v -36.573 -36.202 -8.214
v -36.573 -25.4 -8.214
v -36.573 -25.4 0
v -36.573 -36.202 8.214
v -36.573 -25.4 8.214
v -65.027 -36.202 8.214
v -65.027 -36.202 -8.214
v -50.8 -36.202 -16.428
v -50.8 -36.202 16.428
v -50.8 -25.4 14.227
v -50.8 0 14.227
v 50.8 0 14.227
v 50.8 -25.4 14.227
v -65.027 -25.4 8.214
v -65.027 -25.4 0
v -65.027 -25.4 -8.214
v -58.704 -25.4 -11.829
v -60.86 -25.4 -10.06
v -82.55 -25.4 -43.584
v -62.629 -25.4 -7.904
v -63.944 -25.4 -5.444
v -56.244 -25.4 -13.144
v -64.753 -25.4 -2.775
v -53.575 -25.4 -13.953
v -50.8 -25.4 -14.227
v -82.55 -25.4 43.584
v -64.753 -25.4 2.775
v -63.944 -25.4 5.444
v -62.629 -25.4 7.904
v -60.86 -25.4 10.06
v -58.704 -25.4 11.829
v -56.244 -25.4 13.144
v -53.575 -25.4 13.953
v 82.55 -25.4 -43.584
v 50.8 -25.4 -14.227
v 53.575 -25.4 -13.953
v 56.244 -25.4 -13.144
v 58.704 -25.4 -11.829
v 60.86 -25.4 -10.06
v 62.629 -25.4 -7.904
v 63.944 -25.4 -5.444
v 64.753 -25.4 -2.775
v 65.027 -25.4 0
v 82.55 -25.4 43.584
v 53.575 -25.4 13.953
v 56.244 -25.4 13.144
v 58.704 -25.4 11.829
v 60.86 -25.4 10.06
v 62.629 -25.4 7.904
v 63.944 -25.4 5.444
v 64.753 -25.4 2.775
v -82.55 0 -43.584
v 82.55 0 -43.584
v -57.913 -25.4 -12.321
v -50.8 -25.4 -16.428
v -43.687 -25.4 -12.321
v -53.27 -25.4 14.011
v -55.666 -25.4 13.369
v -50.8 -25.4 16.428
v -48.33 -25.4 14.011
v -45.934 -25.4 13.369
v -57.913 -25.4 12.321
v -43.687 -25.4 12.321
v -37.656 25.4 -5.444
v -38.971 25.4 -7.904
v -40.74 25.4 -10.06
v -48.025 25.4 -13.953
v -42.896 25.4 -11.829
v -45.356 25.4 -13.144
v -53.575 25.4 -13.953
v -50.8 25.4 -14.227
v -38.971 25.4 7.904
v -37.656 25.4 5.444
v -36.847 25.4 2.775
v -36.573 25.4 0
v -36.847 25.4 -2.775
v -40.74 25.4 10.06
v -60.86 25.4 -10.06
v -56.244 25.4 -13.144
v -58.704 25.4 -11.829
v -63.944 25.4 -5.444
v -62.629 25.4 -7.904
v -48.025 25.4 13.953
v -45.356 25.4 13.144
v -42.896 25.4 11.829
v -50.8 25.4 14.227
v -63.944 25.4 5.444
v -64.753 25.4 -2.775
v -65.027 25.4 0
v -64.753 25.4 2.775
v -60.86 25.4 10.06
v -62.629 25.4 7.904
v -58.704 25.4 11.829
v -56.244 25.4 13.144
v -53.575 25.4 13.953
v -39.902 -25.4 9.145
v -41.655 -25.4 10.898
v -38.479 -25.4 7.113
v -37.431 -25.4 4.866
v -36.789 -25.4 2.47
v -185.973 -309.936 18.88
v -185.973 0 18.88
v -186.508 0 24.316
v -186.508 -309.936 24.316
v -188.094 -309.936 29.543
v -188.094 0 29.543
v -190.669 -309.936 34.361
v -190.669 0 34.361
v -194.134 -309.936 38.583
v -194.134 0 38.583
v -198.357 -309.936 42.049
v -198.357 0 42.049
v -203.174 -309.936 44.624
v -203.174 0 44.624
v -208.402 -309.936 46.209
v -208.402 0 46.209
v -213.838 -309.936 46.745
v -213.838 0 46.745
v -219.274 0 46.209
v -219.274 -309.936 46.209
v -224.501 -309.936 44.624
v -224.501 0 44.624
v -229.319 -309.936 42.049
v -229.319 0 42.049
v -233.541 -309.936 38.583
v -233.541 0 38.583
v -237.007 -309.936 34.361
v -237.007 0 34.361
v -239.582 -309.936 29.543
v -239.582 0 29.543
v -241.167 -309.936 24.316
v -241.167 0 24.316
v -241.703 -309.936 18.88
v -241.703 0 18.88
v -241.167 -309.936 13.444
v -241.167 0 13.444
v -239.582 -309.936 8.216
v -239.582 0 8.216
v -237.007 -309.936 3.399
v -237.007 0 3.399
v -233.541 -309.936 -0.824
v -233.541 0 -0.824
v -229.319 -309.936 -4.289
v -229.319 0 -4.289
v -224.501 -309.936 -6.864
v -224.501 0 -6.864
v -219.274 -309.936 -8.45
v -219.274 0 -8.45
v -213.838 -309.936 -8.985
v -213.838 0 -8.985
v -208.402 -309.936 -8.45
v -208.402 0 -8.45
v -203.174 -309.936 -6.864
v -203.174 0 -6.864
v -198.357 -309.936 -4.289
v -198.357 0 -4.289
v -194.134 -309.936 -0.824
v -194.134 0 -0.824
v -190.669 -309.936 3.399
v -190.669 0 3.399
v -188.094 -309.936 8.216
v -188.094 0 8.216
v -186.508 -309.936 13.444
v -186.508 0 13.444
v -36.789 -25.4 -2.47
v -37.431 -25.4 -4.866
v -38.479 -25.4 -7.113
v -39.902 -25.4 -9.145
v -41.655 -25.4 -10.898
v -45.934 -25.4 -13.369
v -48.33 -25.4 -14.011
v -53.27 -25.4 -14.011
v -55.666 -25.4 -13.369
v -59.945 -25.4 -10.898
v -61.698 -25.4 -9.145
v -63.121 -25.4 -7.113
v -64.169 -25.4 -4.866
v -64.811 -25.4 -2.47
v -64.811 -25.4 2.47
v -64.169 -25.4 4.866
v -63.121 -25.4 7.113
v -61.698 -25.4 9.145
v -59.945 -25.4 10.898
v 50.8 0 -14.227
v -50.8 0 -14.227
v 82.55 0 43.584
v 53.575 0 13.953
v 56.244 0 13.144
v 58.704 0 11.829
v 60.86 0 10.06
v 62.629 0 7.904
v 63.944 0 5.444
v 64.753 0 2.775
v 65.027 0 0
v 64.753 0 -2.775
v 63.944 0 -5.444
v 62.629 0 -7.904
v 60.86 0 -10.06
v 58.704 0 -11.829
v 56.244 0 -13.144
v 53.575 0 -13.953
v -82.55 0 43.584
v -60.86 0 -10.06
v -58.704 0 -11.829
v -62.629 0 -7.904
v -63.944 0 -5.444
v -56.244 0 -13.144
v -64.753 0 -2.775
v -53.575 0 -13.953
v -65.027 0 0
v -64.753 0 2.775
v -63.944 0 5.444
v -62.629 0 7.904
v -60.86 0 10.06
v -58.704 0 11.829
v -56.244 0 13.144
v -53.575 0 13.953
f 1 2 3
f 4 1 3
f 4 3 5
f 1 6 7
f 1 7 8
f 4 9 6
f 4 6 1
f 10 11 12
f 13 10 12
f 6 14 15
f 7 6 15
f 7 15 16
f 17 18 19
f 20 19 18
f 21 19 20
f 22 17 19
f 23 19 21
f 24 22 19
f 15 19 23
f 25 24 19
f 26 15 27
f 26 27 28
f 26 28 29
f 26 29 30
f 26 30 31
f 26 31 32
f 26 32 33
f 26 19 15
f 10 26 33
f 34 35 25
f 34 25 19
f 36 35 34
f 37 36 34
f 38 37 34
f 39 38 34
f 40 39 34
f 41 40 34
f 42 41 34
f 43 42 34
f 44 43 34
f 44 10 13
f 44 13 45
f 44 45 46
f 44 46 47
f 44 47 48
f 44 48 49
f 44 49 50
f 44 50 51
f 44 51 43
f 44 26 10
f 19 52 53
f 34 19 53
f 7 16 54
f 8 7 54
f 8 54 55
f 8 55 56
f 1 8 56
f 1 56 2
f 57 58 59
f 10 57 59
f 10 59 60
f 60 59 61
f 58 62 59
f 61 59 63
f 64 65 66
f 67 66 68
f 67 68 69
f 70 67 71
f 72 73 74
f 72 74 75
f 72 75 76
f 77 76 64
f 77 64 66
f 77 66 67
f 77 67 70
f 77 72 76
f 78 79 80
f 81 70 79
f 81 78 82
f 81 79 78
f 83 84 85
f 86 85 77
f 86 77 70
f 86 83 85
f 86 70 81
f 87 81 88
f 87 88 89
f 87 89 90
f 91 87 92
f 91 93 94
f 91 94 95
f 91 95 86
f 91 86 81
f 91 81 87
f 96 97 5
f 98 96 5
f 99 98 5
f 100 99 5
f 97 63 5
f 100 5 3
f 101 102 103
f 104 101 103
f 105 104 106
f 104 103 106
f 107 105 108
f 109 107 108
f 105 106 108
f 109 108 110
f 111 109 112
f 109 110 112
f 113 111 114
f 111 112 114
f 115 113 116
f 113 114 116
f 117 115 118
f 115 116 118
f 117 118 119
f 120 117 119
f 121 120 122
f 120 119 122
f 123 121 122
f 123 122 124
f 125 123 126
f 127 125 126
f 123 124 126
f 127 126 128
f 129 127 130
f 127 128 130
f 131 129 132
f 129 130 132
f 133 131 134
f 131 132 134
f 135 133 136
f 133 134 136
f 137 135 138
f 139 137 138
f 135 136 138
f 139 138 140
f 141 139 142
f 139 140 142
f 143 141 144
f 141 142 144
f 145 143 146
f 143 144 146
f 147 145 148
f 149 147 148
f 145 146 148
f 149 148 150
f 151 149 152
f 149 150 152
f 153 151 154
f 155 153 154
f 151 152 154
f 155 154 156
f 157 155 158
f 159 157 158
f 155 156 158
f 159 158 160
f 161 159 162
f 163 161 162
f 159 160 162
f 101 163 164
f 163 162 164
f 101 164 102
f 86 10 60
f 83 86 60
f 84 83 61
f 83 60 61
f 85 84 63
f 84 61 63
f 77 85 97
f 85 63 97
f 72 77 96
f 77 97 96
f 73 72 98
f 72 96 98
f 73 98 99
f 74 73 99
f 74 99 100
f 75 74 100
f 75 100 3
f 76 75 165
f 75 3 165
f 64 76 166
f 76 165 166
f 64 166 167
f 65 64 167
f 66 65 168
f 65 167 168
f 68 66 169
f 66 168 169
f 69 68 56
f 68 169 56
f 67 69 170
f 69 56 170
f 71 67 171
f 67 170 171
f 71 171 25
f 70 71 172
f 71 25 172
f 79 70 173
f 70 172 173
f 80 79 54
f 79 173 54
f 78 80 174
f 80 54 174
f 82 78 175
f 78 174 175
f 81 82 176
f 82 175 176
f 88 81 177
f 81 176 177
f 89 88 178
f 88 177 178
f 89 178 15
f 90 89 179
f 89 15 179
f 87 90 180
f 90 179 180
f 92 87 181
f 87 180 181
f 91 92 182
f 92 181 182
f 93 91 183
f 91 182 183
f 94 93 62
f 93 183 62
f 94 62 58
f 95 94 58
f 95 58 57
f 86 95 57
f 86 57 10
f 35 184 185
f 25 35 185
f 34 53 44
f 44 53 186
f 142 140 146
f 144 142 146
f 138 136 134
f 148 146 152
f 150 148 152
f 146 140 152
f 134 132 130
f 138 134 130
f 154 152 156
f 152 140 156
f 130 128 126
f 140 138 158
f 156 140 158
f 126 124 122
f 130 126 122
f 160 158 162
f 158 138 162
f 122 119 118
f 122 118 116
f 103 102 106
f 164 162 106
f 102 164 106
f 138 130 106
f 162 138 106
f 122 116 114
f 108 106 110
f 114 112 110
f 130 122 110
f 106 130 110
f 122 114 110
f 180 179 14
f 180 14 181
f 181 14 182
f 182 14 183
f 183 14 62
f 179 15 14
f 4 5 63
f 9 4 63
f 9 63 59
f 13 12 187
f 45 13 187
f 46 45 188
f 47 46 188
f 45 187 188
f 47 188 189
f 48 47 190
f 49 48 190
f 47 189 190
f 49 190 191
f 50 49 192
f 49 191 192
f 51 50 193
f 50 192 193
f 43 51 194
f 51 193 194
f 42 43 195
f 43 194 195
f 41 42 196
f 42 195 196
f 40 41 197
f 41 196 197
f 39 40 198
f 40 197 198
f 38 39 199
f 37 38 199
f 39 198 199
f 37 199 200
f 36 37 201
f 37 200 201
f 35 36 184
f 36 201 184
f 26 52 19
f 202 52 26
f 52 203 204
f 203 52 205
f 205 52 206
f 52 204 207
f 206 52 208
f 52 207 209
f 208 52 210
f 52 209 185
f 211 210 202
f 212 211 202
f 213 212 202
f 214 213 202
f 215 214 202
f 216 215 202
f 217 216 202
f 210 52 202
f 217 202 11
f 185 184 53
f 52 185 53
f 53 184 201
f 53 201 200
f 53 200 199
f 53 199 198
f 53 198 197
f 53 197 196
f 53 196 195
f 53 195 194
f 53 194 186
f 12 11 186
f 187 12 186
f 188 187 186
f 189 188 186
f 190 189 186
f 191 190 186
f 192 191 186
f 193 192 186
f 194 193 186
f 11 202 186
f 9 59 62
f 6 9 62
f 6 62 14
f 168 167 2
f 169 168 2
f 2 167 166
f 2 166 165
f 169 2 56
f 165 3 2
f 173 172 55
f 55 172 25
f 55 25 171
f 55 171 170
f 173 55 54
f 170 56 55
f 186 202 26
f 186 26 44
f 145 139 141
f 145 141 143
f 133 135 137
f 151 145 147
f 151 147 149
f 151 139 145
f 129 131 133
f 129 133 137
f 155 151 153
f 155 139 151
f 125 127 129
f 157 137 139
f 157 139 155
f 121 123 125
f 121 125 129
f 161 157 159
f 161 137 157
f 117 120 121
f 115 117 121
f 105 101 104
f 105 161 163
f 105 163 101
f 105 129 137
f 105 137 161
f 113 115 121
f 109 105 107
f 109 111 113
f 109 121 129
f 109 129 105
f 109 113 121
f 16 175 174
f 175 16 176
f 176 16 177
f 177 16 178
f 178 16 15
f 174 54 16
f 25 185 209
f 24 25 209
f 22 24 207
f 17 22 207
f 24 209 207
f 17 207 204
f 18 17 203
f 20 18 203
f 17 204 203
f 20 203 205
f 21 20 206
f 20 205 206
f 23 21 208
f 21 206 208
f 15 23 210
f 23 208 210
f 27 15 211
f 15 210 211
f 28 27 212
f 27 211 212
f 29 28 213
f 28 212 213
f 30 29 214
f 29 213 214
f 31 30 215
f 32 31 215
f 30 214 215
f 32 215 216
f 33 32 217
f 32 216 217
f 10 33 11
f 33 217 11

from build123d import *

# Parameters (mm, degrees)
F0_W     = 165.1000029331
F0_H     = 87.1681807961
F1_DEPTH = 25.4
F3_DEPTH = 10.80206
F5_DEPTH = 50.8
F6_R     = 27.8649500895
F7_DEPTH = 309.9365


with BuildPart() as f1:
    # F0 (on Front) → F1 (new body)
    with BuildSketch(Plane.XZ):
        Rectangle(F0_W, F0_H)
        with BuildLine():
            ThreePointArc((-50.8, -14.2267111767), (-65.0267111767, 0), (-50.8, 14.2267111767))
            Line((-50.8, 14.2267111767), (50.8, 14.2267111767))
            ThreePointArc((50.8, 14.2267111767), (65.0267111767, 0), (50.8, -14.2267111767))
            Line((50.8, -14.2267111767), (-50.8, -14.2267111767))
        make_face(mode=Mode.SUBTRACT)
    extrude(amount=F1_DEPTH)


with BuildPart() as f3:
    # F2 (on face) → F3 (new body)
    with BuildSketch(Plane.XZ.offset(25.4)):
        Polygon((-65.0267111767, 8.2137955275), (-65.0267111767, -8.2137955275), (-50.8, -16.4275910551), (-36.5732888233, -8.2137955275), (-36.5732888233, 8.2137955275), (-50.8, 16.4275910551), align=None)
    extrude(amount=F3_DEPTH)

    # F4 (on face) → F5 (join)
    with BuildSketch(Plane(origin=(0, -25.4, 0), x_dir=(-1, 0, 0), z_dir=(0, 1, 0))):
        with BuildLine():
            ThreePointArc((50.8, -14.2267111767), (65.0267111767, 0), (50.8, 14.2267111767))
            ThreePointArc((50.8, 14.2267111767), (36.5732888233, 0), (50.8, -14.2267111767))
        make_face()
    extrude(amount=F5_DEPTH)


with BuildPart() as f7:
    # F6 (on Front) → F7 (new body)
    with BuildSketch(Plane.XZ):
        with Locations((-213.837787509, 18.8797675073)):
            Circle(F6_R)
    extrude(amount=F7_DEPTH)


solid = Compound([f1.part, f3.part, f7.part])
